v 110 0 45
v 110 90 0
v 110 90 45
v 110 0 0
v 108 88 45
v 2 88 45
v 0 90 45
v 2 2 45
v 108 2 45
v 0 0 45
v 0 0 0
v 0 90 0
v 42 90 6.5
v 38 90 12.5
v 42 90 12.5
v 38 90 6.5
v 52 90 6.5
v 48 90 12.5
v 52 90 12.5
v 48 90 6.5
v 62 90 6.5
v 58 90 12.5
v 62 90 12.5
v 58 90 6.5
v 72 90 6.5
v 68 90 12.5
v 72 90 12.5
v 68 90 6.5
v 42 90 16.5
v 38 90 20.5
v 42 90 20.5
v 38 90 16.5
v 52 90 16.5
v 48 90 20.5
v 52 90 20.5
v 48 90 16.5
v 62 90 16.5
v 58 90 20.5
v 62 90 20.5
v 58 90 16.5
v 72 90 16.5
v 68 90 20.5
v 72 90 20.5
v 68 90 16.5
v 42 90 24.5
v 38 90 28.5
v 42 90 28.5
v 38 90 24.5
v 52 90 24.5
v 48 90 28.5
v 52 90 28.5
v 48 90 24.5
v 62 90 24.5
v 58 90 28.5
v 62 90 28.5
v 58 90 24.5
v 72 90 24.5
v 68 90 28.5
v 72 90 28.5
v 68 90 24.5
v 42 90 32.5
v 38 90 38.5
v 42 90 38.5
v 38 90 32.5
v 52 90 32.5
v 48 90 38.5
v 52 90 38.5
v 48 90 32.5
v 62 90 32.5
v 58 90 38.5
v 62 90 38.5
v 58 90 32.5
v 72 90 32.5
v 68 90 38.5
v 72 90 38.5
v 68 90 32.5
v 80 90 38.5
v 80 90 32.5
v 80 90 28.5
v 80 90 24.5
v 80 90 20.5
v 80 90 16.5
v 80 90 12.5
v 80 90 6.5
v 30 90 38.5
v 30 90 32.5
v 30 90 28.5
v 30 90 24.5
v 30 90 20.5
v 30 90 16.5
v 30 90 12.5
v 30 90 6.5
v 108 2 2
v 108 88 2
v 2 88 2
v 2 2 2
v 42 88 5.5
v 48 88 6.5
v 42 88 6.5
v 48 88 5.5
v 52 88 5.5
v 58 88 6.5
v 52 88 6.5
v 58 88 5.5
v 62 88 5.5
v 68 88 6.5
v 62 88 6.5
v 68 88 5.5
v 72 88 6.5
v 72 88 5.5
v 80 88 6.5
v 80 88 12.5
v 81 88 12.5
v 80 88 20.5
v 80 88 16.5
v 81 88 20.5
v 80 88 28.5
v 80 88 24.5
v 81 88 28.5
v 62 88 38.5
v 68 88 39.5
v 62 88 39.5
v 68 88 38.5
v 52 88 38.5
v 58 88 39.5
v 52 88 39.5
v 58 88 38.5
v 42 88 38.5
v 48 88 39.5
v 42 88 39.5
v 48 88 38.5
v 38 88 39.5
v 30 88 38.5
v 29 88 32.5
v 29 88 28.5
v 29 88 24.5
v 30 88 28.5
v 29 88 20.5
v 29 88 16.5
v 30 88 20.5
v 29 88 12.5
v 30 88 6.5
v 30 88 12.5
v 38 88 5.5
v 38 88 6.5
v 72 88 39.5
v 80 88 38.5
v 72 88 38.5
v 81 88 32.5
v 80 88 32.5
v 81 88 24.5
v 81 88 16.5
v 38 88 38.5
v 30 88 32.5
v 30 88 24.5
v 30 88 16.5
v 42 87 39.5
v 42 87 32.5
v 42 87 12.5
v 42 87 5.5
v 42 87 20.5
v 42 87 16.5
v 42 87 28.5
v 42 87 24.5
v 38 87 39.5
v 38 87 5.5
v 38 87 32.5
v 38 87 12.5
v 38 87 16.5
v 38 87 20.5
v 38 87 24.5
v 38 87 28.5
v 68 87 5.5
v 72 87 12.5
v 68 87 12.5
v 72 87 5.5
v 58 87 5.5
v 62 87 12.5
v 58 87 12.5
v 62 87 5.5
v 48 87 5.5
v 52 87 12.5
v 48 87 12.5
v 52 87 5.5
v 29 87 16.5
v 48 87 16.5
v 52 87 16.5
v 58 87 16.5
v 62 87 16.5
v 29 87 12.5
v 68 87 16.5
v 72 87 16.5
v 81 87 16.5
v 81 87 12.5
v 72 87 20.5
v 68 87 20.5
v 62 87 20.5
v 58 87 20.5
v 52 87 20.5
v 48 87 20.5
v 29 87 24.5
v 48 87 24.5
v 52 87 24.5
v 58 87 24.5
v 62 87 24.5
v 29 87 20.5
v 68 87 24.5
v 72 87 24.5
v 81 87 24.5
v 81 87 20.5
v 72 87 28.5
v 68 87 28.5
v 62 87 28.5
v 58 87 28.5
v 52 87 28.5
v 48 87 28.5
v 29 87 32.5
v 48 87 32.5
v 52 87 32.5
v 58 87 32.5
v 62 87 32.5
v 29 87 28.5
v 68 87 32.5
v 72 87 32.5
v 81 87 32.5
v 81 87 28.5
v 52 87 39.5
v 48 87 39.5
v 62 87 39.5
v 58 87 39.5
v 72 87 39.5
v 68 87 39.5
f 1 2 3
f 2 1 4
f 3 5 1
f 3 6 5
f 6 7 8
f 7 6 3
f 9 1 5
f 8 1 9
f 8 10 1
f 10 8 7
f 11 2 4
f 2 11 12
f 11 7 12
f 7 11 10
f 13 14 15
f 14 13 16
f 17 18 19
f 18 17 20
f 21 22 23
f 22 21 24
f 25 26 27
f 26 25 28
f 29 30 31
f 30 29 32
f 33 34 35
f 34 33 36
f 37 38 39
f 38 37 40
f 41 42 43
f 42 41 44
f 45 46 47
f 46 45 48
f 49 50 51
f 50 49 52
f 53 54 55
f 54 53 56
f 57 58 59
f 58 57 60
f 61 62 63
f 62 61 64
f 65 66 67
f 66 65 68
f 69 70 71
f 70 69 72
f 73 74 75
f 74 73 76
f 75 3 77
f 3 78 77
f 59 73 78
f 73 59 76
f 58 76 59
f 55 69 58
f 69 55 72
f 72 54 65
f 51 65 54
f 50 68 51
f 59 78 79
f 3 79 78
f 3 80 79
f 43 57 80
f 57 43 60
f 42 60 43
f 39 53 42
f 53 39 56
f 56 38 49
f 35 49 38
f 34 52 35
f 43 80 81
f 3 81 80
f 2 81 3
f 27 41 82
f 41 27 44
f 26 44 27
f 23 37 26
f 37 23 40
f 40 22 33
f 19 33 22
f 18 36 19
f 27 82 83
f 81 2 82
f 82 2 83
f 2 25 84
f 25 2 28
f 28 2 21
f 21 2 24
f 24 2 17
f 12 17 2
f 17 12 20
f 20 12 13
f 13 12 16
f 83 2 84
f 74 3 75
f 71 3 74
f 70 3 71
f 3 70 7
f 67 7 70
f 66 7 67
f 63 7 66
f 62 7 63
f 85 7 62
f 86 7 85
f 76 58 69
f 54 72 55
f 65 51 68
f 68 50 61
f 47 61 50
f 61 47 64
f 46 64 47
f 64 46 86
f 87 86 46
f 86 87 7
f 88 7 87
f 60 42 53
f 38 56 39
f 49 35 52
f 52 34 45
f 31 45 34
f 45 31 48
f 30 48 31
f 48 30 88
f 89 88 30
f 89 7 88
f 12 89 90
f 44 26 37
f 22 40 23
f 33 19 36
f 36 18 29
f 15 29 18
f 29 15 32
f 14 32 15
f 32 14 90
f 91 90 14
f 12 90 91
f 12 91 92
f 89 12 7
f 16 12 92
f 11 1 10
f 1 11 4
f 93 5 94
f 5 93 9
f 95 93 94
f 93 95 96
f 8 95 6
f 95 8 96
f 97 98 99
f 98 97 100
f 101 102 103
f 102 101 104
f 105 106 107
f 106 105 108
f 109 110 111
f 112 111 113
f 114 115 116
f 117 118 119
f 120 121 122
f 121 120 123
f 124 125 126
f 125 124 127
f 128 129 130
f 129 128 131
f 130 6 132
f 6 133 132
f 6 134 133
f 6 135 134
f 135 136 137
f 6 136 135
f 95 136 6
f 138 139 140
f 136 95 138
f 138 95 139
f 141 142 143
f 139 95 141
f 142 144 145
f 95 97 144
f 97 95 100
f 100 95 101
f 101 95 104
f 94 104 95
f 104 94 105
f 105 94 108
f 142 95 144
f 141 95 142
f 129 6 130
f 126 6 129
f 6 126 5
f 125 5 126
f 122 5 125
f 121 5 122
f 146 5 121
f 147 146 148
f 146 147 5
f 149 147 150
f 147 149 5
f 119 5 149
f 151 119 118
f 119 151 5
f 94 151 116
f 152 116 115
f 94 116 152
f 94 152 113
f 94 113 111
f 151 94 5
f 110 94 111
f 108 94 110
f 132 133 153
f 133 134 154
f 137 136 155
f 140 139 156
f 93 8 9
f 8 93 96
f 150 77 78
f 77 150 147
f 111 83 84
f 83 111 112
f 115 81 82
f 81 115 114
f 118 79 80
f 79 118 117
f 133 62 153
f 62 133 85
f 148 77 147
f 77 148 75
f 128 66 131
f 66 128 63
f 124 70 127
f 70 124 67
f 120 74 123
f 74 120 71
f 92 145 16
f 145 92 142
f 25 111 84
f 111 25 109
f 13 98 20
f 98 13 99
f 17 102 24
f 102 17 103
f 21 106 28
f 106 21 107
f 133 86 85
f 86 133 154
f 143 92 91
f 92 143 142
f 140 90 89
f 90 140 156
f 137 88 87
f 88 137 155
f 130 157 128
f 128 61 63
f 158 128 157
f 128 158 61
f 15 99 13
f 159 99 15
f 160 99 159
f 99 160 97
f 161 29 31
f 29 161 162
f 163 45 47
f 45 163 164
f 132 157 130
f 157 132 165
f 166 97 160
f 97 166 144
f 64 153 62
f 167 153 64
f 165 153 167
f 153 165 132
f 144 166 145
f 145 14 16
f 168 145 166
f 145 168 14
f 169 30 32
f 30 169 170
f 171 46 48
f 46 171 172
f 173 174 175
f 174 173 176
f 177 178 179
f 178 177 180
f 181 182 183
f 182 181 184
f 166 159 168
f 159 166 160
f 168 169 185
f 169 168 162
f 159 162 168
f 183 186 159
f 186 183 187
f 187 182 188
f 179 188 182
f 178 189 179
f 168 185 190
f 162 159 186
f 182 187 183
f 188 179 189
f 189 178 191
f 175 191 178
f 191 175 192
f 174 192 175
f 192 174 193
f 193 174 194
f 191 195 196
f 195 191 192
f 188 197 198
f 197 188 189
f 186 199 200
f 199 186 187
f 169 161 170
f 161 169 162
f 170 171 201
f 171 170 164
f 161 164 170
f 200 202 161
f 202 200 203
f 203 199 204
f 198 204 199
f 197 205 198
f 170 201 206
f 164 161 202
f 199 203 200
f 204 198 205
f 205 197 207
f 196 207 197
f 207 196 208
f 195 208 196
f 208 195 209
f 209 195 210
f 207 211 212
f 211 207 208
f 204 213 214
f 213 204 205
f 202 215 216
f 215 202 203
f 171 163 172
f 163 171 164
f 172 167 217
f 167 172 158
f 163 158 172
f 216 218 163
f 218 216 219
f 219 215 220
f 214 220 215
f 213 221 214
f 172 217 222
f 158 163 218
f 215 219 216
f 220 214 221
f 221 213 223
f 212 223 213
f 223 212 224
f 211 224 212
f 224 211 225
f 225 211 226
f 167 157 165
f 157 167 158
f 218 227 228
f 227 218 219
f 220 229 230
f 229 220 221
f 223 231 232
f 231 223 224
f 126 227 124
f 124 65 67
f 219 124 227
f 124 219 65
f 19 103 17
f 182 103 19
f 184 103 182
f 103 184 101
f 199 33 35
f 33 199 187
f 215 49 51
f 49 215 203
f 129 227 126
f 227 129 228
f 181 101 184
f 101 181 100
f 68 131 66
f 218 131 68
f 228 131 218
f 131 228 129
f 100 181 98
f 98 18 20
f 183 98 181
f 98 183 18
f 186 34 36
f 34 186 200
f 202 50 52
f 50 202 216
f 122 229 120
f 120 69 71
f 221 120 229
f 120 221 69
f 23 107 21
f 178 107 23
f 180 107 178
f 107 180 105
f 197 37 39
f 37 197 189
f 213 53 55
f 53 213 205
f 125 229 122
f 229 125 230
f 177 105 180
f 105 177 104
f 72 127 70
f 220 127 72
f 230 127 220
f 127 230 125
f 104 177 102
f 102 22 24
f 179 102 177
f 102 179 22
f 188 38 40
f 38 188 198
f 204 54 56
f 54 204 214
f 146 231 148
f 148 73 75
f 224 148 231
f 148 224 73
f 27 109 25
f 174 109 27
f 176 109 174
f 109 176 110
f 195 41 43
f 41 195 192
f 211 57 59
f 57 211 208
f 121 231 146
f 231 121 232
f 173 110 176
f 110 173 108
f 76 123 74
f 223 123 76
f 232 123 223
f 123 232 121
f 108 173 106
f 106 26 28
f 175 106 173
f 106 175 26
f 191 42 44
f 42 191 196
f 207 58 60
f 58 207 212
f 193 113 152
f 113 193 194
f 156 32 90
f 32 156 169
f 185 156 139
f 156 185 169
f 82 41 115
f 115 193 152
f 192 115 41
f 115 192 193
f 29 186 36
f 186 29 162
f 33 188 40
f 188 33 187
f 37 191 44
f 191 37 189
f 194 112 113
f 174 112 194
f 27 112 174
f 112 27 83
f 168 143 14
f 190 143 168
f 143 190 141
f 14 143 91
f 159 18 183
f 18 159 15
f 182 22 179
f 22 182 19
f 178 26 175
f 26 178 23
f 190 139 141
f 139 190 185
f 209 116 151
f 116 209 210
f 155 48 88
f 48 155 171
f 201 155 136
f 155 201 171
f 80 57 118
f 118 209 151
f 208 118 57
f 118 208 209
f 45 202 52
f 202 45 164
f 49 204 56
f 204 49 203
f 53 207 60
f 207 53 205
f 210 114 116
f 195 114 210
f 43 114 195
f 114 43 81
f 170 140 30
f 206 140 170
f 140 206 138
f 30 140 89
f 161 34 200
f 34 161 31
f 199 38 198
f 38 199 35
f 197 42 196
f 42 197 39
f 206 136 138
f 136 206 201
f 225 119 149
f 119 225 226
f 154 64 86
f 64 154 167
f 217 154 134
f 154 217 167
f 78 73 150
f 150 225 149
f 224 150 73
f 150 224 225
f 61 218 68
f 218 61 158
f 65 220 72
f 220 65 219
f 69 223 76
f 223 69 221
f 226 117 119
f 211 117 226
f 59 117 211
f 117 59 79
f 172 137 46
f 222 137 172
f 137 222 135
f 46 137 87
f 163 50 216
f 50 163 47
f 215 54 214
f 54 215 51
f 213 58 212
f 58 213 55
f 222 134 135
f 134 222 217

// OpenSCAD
$fn = 32;

// ----------------------------------------------------------------------
// Vent box: crossgrid enclosure
// ----------------------------------------------------------------------

// --- parameters (mm) ---
box_l = 110;              // box length, X
box_w = 90;               // box width, Y
box_h = 45;               // box height, Z
wall_t = 2;               // shell wall thickness
win_l = 50;               // vent window width, X
win_h = 32;               // vent window height, Z
bar_w = 4;                // grid bar width
n_v = 4;                  // vertical bar count
n_h = 3;                  // horizontal bar count
fit_tol = 0.02;           // tolerance for press fits, mm
free_tol = 0.2;           // tolerance for clearance fits, mm

win_z0 = (box_h - win_h) / 2;  // window lower edge Z
v_step = win_l / (n_v + 1);  // vertical bar step
h_step = win_h / (n_h + 1);  // horizontal bar step

difference() {
  union() {
    difference() {
      cube([box_l, box_w, box_h]);
  translate([wall_t, wall_t, wall_t])
    cube([box_l - 2 * wall_t, box_w - 2 * wall_t, box_h]);
  translate([(box_l - win_l) / 2, box_w - wall_t - 1, win_z0])
    cube([win_l, wall_t + 2, win_h]);
    }
    for (i = [1 : n_v])
      translate([(box_l - win_l) / 2 + i * v_step - bar_w / 2,
                 box_w - wall_t - 1, win_z0 - 1])
        cube([bar_w, wall_t + 1, win_h + 2]);
    for (i = [1 : n_h])
      translate([(box_l - win_l) / 2 - 1, box_w - wall_t - 1,
                 win_z0 + i * h_step - bar_w / 2])
        cube([win_l + 2, wall_t + 1, bar_w]);
  }
}
